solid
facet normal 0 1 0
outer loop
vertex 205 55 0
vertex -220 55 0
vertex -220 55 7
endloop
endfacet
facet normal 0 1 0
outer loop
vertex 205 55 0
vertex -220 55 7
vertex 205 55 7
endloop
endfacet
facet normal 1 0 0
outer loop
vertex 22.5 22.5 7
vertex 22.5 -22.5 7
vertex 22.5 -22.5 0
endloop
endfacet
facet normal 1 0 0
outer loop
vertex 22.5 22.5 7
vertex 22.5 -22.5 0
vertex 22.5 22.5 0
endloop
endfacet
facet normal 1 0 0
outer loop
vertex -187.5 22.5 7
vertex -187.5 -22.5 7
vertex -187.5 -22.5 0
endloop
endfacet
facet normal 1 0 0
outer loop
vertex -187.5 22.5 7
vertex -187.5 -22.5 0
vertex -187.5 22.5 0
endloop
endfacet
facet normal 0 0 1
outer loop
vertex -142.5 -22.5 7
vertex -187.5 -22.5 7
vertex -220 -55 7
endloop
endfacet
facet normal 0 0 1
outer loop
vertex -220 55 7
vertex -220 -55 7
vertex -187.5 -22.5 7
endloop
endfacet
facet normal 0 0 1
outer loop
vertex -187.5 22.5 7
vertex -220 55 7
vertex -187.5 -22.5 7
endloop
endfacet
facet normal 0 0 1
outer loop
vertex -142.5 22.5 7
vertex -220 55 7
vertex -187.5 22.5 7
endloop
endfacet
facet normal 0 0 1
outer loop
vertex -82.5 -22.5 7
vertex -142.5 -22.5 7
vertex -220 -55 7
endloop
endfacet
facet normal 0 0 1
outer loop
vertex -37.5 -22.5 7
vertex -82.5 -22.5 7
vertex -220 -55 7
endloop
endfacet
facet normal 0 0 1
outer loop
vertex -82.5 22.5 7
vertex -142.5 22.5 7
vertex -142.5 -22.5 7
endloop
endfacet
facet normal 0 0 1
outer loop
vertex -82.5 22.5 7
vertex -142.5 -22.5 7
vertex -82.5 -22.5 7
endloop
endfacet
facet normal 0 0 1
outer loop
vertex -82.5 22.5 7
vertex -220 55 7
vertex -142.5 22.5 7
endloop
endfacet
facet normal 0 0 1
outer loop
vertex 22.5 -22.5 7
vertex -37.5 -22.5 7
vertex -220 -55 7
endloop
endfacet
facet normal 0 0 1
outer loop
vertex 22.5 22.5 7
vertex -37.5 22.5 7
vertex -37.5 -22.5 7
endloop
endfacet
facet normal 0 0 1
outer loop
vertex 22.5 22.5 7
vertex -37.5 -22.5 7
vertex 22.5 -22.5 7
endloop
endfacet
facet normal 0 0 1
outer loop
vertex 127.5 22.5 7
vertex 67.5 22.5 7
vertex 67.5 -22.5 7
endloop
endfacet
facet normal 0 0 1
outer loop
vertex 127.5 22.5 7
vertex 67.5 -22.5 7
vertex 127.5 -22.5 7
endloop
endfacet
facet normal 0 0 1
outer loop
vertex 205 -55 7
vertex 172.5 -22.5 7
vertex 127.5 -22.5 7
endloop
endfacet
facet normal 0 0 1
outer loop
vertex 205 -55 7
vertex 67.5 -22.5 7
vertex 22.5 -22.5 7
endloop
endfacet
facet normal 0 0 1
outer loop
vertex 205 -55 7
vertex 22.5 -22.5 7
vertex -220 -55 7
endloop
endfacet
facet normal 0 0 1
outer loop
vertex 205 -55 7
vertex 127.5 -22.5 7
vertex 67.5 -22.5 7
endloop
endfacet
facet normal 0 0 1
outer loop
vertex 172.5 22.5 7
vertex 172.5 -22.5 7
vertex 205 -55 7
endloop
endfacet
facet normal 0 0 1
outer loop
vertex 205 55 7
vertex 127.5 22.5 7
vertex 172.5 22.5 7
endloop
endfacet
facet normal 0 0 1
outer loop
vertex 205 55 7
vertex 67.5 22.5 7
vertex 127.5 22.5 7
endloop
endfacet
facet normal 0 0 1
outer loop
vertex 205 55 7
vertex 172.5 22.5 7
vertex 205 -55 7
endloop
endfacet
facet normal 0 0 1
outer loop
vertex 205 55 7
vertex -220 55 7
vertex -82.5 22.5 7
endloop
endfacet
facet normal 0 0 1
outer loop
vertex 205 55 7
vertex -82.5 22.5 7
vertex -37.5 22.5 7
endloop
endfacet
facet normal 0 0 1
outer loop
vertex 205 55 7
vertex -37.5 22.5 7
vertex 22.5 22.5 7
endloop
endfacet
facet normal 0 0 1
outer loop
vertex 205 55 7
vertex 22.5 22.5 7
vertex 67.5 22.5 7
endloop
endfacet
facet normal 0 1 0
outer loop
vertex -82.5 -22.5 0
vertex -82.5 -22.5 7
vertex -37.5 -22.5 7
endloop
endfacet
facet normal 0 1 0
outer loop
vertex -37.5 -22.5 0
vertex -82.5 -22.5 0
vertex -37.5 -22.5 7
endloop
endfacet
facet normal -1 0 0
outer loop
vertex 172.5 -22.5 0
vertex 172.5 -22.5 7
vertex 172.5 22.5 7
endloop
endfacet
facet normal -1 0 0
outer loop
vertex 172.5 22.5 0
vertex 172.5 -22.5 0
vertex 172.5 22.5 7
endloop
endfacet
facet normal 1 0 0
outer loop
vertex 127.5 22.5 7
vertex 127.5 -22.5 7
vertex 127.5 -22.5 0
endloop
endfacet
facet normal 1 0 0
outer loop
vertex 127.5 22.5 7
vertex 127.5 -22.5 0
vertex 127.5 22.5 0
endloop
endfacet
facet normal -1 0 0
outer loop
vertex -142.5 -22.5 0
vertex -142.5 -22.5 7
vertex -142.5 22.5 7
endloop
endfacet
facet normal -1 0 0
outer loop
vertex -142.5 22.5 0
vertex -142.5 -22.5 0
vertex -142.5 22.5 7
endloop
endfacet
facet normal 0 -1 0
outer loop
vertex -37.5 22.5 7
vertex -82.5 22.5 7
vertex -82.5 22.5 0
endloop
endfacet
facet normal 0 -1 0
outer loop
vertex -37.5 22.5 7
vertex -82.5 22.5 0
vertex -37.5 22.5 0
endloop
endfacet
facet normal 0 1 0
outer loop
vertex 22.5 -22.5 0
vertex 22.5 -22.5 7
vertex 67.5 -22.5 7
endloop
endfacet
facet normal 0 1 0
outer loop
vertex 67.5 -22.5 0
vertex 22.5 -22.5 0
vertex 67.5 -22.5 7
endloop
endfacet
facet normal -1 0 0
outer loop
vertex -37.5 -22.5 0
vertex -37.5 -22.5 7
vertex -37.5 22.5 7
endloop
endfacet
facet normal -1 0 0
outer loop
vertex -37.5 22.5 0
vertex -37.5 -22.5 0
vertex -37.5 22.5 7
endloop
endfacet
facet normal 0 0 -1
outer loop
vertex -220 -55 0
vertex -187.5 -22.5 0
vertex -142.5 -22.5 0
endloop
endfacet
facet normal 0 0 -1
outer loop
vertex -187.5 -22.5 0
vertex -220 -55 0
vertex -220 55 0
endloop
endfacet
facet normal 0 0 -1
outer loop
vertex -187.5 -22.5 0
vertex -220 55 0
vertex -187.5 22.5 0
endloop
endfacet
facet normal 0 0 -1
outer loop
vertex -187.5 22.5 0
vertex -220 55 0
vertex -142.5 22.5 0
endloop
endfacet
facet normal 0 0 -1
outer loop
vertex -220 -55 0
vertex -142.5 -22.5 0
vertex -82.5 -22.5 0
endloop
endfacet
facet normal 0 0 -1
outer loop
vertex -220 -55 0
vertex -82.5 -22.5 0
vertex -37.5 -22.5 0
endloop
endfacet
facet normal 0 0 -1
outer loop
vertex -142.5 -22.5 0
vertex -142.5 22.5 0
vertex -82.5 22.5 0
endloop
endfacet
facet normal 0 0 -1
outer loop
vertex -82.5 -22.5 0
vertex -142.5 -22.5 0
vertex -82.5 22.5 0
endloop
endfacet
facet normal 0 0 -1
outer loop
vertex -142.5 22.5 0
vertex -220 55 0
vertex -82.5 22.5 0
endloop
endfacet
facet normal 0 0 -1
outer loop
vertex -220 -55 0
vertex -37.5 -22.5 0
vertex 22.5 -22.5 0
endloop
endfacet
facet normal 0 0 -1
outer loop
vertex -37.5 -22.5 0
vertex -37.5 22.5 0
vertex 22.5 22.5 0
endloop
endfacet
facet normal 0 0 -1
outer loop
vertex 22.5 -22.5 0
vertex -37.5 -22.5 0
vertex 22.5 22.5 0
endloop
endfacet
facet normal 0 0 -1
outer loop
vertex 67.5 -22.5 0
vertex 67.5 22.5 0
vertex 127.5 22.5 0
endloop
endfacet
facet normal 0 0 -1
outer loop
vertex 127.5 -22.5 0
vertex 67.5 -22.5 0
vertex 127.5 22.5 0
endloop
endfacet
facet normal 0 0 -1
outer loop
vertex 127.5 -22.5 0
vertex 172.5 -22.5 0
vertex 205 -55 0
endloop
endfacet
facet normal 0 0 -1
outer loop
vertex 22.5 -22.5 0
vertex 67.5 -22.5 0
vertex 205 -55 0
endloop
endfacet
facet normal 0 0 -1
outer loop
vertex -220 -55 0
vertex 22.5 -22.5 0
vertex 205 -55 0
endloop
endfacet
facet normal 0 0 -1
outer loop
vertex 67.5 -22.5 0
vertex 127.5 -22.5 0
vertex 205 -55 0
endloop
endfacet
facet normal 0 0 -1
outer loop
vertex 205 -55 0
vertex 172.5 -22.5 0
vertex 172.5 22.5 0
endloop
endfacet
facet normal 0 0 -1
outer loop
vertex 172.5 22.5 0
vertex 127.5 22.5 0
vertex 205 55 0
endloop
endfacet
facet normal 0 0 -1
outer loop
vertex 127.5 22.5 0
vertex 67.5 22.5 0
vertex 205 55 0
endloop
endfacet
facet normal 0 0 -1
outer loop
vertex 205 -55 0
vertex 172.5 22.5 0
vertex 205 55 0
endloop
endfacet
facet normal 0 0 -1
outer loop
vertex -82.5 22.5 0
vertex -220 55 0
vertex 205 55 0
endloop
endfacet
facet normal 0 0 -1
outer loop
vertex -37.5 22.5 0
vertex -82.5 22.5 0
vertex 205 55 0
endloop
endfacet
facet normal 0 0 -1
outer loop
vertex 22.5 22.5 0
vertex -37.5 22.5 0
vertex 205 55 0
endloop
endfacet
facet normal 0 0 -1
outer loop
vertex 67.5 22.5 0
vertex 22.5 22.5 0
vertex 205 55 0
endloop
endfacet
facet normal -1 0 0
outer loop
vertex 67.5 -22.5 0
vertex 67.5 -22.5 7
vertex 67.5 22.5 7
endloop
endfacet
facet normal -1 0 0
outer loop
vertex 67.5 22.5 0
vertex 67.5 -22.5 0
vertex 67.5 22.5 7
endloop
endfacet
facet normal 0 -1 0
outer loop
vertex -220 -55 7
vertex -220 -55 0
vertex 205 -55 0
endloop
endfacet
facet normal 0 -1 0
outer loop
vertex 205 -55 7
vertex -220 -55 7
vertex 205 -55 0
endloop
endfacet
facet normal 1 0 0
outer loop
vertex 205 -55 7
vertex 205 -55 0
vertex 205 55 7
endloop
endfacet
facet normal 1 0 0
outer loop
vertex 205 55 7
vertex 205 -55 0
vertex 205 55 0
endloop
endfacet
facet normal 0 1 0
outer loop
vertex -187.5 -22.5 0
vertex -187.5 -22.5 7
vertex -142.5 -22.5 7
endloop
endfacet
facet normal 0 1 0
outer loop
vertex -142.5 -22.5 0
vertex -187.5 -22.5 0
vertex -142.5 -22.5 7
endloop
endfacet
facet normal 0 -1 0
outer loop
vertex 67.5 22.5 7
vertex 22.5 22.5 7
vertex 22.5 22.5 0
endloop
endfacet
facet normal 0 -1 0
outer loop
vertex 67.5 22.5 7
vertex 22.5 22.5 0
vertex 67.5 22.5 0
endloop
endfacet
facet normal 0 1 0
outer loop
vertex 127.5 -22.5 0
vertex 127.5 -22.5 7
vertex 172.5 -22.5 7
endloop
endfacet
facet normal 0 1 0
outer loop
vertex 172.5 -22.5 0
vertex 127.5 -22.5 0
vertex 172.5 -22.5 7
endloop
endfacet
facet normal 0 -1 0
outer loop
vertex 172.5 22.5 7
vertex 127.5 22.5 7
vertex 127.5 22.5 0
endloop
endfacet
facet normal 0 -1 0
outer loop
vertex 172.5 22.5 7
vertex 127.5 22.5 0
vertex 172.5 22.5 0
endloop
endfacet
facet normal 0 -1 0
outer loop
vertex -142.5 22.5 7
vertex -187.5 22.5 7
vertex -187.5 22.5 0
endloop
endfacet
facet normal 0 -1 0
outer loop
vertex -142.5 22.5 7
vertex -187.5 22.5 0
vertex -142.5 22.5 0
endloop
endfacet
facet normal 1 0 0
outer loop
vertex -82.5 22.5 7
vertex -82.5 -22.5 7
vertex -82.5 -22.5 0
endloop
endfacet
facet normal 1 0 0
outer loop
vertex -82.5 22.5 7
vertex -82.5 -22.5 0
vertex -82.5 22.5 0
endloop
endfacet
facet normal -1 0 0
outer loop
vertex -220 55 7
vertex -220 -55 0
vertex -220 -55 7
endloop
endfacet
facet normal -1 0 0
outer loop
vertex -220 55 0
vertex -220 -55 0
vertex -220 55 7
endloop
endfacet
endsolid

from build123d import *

# Parameters (mm, degrees)
F0_W     = 410
F0_H     = 110
F1_DEPTH = 7
F2_W     = 45
F2_H     = 45
F3_DEPTH = 25
F0_W_2   = 15
F4_DEPTH = 7


# Not quite as in the source:
# - a feature names something its author has since deleted; it is built from what else it names


with BuildPart() as f1:
    # F0 (on Top) → F1 (new body)
    with BuildSketch(Plane.XY):
        Rectangle(F0_W, F0_H)
    extrude(amount=F1_DEPTH)

    # F2 (on face) → F3 (cut)
    with BuildSketch(Plane.XY.offset(7)):
        with Locations((-60, 0)):
            Rectangle(F2_W, F2_H)
        with Locations((45, 0)):
            Rectangle(F2_W, F2_H)
        with Locations((150, 0)):
            Rectangle(F2_W, F2_H)
        with Locations((-165, 0)):
            Rectangle(F2_W, F2_H)
    extrude(amount=-F3_DEPTH, mode=Mode.SUBTRACT)

    # F0 (on Top) → F4 (join)
    with BuildSketch(Plane.XY):
        with Locations((-212.5, 0)):
            Rectangle(F0_W_2, F0_H)
    extrude(amount=F4_DEPTH)


solid = f1.part
